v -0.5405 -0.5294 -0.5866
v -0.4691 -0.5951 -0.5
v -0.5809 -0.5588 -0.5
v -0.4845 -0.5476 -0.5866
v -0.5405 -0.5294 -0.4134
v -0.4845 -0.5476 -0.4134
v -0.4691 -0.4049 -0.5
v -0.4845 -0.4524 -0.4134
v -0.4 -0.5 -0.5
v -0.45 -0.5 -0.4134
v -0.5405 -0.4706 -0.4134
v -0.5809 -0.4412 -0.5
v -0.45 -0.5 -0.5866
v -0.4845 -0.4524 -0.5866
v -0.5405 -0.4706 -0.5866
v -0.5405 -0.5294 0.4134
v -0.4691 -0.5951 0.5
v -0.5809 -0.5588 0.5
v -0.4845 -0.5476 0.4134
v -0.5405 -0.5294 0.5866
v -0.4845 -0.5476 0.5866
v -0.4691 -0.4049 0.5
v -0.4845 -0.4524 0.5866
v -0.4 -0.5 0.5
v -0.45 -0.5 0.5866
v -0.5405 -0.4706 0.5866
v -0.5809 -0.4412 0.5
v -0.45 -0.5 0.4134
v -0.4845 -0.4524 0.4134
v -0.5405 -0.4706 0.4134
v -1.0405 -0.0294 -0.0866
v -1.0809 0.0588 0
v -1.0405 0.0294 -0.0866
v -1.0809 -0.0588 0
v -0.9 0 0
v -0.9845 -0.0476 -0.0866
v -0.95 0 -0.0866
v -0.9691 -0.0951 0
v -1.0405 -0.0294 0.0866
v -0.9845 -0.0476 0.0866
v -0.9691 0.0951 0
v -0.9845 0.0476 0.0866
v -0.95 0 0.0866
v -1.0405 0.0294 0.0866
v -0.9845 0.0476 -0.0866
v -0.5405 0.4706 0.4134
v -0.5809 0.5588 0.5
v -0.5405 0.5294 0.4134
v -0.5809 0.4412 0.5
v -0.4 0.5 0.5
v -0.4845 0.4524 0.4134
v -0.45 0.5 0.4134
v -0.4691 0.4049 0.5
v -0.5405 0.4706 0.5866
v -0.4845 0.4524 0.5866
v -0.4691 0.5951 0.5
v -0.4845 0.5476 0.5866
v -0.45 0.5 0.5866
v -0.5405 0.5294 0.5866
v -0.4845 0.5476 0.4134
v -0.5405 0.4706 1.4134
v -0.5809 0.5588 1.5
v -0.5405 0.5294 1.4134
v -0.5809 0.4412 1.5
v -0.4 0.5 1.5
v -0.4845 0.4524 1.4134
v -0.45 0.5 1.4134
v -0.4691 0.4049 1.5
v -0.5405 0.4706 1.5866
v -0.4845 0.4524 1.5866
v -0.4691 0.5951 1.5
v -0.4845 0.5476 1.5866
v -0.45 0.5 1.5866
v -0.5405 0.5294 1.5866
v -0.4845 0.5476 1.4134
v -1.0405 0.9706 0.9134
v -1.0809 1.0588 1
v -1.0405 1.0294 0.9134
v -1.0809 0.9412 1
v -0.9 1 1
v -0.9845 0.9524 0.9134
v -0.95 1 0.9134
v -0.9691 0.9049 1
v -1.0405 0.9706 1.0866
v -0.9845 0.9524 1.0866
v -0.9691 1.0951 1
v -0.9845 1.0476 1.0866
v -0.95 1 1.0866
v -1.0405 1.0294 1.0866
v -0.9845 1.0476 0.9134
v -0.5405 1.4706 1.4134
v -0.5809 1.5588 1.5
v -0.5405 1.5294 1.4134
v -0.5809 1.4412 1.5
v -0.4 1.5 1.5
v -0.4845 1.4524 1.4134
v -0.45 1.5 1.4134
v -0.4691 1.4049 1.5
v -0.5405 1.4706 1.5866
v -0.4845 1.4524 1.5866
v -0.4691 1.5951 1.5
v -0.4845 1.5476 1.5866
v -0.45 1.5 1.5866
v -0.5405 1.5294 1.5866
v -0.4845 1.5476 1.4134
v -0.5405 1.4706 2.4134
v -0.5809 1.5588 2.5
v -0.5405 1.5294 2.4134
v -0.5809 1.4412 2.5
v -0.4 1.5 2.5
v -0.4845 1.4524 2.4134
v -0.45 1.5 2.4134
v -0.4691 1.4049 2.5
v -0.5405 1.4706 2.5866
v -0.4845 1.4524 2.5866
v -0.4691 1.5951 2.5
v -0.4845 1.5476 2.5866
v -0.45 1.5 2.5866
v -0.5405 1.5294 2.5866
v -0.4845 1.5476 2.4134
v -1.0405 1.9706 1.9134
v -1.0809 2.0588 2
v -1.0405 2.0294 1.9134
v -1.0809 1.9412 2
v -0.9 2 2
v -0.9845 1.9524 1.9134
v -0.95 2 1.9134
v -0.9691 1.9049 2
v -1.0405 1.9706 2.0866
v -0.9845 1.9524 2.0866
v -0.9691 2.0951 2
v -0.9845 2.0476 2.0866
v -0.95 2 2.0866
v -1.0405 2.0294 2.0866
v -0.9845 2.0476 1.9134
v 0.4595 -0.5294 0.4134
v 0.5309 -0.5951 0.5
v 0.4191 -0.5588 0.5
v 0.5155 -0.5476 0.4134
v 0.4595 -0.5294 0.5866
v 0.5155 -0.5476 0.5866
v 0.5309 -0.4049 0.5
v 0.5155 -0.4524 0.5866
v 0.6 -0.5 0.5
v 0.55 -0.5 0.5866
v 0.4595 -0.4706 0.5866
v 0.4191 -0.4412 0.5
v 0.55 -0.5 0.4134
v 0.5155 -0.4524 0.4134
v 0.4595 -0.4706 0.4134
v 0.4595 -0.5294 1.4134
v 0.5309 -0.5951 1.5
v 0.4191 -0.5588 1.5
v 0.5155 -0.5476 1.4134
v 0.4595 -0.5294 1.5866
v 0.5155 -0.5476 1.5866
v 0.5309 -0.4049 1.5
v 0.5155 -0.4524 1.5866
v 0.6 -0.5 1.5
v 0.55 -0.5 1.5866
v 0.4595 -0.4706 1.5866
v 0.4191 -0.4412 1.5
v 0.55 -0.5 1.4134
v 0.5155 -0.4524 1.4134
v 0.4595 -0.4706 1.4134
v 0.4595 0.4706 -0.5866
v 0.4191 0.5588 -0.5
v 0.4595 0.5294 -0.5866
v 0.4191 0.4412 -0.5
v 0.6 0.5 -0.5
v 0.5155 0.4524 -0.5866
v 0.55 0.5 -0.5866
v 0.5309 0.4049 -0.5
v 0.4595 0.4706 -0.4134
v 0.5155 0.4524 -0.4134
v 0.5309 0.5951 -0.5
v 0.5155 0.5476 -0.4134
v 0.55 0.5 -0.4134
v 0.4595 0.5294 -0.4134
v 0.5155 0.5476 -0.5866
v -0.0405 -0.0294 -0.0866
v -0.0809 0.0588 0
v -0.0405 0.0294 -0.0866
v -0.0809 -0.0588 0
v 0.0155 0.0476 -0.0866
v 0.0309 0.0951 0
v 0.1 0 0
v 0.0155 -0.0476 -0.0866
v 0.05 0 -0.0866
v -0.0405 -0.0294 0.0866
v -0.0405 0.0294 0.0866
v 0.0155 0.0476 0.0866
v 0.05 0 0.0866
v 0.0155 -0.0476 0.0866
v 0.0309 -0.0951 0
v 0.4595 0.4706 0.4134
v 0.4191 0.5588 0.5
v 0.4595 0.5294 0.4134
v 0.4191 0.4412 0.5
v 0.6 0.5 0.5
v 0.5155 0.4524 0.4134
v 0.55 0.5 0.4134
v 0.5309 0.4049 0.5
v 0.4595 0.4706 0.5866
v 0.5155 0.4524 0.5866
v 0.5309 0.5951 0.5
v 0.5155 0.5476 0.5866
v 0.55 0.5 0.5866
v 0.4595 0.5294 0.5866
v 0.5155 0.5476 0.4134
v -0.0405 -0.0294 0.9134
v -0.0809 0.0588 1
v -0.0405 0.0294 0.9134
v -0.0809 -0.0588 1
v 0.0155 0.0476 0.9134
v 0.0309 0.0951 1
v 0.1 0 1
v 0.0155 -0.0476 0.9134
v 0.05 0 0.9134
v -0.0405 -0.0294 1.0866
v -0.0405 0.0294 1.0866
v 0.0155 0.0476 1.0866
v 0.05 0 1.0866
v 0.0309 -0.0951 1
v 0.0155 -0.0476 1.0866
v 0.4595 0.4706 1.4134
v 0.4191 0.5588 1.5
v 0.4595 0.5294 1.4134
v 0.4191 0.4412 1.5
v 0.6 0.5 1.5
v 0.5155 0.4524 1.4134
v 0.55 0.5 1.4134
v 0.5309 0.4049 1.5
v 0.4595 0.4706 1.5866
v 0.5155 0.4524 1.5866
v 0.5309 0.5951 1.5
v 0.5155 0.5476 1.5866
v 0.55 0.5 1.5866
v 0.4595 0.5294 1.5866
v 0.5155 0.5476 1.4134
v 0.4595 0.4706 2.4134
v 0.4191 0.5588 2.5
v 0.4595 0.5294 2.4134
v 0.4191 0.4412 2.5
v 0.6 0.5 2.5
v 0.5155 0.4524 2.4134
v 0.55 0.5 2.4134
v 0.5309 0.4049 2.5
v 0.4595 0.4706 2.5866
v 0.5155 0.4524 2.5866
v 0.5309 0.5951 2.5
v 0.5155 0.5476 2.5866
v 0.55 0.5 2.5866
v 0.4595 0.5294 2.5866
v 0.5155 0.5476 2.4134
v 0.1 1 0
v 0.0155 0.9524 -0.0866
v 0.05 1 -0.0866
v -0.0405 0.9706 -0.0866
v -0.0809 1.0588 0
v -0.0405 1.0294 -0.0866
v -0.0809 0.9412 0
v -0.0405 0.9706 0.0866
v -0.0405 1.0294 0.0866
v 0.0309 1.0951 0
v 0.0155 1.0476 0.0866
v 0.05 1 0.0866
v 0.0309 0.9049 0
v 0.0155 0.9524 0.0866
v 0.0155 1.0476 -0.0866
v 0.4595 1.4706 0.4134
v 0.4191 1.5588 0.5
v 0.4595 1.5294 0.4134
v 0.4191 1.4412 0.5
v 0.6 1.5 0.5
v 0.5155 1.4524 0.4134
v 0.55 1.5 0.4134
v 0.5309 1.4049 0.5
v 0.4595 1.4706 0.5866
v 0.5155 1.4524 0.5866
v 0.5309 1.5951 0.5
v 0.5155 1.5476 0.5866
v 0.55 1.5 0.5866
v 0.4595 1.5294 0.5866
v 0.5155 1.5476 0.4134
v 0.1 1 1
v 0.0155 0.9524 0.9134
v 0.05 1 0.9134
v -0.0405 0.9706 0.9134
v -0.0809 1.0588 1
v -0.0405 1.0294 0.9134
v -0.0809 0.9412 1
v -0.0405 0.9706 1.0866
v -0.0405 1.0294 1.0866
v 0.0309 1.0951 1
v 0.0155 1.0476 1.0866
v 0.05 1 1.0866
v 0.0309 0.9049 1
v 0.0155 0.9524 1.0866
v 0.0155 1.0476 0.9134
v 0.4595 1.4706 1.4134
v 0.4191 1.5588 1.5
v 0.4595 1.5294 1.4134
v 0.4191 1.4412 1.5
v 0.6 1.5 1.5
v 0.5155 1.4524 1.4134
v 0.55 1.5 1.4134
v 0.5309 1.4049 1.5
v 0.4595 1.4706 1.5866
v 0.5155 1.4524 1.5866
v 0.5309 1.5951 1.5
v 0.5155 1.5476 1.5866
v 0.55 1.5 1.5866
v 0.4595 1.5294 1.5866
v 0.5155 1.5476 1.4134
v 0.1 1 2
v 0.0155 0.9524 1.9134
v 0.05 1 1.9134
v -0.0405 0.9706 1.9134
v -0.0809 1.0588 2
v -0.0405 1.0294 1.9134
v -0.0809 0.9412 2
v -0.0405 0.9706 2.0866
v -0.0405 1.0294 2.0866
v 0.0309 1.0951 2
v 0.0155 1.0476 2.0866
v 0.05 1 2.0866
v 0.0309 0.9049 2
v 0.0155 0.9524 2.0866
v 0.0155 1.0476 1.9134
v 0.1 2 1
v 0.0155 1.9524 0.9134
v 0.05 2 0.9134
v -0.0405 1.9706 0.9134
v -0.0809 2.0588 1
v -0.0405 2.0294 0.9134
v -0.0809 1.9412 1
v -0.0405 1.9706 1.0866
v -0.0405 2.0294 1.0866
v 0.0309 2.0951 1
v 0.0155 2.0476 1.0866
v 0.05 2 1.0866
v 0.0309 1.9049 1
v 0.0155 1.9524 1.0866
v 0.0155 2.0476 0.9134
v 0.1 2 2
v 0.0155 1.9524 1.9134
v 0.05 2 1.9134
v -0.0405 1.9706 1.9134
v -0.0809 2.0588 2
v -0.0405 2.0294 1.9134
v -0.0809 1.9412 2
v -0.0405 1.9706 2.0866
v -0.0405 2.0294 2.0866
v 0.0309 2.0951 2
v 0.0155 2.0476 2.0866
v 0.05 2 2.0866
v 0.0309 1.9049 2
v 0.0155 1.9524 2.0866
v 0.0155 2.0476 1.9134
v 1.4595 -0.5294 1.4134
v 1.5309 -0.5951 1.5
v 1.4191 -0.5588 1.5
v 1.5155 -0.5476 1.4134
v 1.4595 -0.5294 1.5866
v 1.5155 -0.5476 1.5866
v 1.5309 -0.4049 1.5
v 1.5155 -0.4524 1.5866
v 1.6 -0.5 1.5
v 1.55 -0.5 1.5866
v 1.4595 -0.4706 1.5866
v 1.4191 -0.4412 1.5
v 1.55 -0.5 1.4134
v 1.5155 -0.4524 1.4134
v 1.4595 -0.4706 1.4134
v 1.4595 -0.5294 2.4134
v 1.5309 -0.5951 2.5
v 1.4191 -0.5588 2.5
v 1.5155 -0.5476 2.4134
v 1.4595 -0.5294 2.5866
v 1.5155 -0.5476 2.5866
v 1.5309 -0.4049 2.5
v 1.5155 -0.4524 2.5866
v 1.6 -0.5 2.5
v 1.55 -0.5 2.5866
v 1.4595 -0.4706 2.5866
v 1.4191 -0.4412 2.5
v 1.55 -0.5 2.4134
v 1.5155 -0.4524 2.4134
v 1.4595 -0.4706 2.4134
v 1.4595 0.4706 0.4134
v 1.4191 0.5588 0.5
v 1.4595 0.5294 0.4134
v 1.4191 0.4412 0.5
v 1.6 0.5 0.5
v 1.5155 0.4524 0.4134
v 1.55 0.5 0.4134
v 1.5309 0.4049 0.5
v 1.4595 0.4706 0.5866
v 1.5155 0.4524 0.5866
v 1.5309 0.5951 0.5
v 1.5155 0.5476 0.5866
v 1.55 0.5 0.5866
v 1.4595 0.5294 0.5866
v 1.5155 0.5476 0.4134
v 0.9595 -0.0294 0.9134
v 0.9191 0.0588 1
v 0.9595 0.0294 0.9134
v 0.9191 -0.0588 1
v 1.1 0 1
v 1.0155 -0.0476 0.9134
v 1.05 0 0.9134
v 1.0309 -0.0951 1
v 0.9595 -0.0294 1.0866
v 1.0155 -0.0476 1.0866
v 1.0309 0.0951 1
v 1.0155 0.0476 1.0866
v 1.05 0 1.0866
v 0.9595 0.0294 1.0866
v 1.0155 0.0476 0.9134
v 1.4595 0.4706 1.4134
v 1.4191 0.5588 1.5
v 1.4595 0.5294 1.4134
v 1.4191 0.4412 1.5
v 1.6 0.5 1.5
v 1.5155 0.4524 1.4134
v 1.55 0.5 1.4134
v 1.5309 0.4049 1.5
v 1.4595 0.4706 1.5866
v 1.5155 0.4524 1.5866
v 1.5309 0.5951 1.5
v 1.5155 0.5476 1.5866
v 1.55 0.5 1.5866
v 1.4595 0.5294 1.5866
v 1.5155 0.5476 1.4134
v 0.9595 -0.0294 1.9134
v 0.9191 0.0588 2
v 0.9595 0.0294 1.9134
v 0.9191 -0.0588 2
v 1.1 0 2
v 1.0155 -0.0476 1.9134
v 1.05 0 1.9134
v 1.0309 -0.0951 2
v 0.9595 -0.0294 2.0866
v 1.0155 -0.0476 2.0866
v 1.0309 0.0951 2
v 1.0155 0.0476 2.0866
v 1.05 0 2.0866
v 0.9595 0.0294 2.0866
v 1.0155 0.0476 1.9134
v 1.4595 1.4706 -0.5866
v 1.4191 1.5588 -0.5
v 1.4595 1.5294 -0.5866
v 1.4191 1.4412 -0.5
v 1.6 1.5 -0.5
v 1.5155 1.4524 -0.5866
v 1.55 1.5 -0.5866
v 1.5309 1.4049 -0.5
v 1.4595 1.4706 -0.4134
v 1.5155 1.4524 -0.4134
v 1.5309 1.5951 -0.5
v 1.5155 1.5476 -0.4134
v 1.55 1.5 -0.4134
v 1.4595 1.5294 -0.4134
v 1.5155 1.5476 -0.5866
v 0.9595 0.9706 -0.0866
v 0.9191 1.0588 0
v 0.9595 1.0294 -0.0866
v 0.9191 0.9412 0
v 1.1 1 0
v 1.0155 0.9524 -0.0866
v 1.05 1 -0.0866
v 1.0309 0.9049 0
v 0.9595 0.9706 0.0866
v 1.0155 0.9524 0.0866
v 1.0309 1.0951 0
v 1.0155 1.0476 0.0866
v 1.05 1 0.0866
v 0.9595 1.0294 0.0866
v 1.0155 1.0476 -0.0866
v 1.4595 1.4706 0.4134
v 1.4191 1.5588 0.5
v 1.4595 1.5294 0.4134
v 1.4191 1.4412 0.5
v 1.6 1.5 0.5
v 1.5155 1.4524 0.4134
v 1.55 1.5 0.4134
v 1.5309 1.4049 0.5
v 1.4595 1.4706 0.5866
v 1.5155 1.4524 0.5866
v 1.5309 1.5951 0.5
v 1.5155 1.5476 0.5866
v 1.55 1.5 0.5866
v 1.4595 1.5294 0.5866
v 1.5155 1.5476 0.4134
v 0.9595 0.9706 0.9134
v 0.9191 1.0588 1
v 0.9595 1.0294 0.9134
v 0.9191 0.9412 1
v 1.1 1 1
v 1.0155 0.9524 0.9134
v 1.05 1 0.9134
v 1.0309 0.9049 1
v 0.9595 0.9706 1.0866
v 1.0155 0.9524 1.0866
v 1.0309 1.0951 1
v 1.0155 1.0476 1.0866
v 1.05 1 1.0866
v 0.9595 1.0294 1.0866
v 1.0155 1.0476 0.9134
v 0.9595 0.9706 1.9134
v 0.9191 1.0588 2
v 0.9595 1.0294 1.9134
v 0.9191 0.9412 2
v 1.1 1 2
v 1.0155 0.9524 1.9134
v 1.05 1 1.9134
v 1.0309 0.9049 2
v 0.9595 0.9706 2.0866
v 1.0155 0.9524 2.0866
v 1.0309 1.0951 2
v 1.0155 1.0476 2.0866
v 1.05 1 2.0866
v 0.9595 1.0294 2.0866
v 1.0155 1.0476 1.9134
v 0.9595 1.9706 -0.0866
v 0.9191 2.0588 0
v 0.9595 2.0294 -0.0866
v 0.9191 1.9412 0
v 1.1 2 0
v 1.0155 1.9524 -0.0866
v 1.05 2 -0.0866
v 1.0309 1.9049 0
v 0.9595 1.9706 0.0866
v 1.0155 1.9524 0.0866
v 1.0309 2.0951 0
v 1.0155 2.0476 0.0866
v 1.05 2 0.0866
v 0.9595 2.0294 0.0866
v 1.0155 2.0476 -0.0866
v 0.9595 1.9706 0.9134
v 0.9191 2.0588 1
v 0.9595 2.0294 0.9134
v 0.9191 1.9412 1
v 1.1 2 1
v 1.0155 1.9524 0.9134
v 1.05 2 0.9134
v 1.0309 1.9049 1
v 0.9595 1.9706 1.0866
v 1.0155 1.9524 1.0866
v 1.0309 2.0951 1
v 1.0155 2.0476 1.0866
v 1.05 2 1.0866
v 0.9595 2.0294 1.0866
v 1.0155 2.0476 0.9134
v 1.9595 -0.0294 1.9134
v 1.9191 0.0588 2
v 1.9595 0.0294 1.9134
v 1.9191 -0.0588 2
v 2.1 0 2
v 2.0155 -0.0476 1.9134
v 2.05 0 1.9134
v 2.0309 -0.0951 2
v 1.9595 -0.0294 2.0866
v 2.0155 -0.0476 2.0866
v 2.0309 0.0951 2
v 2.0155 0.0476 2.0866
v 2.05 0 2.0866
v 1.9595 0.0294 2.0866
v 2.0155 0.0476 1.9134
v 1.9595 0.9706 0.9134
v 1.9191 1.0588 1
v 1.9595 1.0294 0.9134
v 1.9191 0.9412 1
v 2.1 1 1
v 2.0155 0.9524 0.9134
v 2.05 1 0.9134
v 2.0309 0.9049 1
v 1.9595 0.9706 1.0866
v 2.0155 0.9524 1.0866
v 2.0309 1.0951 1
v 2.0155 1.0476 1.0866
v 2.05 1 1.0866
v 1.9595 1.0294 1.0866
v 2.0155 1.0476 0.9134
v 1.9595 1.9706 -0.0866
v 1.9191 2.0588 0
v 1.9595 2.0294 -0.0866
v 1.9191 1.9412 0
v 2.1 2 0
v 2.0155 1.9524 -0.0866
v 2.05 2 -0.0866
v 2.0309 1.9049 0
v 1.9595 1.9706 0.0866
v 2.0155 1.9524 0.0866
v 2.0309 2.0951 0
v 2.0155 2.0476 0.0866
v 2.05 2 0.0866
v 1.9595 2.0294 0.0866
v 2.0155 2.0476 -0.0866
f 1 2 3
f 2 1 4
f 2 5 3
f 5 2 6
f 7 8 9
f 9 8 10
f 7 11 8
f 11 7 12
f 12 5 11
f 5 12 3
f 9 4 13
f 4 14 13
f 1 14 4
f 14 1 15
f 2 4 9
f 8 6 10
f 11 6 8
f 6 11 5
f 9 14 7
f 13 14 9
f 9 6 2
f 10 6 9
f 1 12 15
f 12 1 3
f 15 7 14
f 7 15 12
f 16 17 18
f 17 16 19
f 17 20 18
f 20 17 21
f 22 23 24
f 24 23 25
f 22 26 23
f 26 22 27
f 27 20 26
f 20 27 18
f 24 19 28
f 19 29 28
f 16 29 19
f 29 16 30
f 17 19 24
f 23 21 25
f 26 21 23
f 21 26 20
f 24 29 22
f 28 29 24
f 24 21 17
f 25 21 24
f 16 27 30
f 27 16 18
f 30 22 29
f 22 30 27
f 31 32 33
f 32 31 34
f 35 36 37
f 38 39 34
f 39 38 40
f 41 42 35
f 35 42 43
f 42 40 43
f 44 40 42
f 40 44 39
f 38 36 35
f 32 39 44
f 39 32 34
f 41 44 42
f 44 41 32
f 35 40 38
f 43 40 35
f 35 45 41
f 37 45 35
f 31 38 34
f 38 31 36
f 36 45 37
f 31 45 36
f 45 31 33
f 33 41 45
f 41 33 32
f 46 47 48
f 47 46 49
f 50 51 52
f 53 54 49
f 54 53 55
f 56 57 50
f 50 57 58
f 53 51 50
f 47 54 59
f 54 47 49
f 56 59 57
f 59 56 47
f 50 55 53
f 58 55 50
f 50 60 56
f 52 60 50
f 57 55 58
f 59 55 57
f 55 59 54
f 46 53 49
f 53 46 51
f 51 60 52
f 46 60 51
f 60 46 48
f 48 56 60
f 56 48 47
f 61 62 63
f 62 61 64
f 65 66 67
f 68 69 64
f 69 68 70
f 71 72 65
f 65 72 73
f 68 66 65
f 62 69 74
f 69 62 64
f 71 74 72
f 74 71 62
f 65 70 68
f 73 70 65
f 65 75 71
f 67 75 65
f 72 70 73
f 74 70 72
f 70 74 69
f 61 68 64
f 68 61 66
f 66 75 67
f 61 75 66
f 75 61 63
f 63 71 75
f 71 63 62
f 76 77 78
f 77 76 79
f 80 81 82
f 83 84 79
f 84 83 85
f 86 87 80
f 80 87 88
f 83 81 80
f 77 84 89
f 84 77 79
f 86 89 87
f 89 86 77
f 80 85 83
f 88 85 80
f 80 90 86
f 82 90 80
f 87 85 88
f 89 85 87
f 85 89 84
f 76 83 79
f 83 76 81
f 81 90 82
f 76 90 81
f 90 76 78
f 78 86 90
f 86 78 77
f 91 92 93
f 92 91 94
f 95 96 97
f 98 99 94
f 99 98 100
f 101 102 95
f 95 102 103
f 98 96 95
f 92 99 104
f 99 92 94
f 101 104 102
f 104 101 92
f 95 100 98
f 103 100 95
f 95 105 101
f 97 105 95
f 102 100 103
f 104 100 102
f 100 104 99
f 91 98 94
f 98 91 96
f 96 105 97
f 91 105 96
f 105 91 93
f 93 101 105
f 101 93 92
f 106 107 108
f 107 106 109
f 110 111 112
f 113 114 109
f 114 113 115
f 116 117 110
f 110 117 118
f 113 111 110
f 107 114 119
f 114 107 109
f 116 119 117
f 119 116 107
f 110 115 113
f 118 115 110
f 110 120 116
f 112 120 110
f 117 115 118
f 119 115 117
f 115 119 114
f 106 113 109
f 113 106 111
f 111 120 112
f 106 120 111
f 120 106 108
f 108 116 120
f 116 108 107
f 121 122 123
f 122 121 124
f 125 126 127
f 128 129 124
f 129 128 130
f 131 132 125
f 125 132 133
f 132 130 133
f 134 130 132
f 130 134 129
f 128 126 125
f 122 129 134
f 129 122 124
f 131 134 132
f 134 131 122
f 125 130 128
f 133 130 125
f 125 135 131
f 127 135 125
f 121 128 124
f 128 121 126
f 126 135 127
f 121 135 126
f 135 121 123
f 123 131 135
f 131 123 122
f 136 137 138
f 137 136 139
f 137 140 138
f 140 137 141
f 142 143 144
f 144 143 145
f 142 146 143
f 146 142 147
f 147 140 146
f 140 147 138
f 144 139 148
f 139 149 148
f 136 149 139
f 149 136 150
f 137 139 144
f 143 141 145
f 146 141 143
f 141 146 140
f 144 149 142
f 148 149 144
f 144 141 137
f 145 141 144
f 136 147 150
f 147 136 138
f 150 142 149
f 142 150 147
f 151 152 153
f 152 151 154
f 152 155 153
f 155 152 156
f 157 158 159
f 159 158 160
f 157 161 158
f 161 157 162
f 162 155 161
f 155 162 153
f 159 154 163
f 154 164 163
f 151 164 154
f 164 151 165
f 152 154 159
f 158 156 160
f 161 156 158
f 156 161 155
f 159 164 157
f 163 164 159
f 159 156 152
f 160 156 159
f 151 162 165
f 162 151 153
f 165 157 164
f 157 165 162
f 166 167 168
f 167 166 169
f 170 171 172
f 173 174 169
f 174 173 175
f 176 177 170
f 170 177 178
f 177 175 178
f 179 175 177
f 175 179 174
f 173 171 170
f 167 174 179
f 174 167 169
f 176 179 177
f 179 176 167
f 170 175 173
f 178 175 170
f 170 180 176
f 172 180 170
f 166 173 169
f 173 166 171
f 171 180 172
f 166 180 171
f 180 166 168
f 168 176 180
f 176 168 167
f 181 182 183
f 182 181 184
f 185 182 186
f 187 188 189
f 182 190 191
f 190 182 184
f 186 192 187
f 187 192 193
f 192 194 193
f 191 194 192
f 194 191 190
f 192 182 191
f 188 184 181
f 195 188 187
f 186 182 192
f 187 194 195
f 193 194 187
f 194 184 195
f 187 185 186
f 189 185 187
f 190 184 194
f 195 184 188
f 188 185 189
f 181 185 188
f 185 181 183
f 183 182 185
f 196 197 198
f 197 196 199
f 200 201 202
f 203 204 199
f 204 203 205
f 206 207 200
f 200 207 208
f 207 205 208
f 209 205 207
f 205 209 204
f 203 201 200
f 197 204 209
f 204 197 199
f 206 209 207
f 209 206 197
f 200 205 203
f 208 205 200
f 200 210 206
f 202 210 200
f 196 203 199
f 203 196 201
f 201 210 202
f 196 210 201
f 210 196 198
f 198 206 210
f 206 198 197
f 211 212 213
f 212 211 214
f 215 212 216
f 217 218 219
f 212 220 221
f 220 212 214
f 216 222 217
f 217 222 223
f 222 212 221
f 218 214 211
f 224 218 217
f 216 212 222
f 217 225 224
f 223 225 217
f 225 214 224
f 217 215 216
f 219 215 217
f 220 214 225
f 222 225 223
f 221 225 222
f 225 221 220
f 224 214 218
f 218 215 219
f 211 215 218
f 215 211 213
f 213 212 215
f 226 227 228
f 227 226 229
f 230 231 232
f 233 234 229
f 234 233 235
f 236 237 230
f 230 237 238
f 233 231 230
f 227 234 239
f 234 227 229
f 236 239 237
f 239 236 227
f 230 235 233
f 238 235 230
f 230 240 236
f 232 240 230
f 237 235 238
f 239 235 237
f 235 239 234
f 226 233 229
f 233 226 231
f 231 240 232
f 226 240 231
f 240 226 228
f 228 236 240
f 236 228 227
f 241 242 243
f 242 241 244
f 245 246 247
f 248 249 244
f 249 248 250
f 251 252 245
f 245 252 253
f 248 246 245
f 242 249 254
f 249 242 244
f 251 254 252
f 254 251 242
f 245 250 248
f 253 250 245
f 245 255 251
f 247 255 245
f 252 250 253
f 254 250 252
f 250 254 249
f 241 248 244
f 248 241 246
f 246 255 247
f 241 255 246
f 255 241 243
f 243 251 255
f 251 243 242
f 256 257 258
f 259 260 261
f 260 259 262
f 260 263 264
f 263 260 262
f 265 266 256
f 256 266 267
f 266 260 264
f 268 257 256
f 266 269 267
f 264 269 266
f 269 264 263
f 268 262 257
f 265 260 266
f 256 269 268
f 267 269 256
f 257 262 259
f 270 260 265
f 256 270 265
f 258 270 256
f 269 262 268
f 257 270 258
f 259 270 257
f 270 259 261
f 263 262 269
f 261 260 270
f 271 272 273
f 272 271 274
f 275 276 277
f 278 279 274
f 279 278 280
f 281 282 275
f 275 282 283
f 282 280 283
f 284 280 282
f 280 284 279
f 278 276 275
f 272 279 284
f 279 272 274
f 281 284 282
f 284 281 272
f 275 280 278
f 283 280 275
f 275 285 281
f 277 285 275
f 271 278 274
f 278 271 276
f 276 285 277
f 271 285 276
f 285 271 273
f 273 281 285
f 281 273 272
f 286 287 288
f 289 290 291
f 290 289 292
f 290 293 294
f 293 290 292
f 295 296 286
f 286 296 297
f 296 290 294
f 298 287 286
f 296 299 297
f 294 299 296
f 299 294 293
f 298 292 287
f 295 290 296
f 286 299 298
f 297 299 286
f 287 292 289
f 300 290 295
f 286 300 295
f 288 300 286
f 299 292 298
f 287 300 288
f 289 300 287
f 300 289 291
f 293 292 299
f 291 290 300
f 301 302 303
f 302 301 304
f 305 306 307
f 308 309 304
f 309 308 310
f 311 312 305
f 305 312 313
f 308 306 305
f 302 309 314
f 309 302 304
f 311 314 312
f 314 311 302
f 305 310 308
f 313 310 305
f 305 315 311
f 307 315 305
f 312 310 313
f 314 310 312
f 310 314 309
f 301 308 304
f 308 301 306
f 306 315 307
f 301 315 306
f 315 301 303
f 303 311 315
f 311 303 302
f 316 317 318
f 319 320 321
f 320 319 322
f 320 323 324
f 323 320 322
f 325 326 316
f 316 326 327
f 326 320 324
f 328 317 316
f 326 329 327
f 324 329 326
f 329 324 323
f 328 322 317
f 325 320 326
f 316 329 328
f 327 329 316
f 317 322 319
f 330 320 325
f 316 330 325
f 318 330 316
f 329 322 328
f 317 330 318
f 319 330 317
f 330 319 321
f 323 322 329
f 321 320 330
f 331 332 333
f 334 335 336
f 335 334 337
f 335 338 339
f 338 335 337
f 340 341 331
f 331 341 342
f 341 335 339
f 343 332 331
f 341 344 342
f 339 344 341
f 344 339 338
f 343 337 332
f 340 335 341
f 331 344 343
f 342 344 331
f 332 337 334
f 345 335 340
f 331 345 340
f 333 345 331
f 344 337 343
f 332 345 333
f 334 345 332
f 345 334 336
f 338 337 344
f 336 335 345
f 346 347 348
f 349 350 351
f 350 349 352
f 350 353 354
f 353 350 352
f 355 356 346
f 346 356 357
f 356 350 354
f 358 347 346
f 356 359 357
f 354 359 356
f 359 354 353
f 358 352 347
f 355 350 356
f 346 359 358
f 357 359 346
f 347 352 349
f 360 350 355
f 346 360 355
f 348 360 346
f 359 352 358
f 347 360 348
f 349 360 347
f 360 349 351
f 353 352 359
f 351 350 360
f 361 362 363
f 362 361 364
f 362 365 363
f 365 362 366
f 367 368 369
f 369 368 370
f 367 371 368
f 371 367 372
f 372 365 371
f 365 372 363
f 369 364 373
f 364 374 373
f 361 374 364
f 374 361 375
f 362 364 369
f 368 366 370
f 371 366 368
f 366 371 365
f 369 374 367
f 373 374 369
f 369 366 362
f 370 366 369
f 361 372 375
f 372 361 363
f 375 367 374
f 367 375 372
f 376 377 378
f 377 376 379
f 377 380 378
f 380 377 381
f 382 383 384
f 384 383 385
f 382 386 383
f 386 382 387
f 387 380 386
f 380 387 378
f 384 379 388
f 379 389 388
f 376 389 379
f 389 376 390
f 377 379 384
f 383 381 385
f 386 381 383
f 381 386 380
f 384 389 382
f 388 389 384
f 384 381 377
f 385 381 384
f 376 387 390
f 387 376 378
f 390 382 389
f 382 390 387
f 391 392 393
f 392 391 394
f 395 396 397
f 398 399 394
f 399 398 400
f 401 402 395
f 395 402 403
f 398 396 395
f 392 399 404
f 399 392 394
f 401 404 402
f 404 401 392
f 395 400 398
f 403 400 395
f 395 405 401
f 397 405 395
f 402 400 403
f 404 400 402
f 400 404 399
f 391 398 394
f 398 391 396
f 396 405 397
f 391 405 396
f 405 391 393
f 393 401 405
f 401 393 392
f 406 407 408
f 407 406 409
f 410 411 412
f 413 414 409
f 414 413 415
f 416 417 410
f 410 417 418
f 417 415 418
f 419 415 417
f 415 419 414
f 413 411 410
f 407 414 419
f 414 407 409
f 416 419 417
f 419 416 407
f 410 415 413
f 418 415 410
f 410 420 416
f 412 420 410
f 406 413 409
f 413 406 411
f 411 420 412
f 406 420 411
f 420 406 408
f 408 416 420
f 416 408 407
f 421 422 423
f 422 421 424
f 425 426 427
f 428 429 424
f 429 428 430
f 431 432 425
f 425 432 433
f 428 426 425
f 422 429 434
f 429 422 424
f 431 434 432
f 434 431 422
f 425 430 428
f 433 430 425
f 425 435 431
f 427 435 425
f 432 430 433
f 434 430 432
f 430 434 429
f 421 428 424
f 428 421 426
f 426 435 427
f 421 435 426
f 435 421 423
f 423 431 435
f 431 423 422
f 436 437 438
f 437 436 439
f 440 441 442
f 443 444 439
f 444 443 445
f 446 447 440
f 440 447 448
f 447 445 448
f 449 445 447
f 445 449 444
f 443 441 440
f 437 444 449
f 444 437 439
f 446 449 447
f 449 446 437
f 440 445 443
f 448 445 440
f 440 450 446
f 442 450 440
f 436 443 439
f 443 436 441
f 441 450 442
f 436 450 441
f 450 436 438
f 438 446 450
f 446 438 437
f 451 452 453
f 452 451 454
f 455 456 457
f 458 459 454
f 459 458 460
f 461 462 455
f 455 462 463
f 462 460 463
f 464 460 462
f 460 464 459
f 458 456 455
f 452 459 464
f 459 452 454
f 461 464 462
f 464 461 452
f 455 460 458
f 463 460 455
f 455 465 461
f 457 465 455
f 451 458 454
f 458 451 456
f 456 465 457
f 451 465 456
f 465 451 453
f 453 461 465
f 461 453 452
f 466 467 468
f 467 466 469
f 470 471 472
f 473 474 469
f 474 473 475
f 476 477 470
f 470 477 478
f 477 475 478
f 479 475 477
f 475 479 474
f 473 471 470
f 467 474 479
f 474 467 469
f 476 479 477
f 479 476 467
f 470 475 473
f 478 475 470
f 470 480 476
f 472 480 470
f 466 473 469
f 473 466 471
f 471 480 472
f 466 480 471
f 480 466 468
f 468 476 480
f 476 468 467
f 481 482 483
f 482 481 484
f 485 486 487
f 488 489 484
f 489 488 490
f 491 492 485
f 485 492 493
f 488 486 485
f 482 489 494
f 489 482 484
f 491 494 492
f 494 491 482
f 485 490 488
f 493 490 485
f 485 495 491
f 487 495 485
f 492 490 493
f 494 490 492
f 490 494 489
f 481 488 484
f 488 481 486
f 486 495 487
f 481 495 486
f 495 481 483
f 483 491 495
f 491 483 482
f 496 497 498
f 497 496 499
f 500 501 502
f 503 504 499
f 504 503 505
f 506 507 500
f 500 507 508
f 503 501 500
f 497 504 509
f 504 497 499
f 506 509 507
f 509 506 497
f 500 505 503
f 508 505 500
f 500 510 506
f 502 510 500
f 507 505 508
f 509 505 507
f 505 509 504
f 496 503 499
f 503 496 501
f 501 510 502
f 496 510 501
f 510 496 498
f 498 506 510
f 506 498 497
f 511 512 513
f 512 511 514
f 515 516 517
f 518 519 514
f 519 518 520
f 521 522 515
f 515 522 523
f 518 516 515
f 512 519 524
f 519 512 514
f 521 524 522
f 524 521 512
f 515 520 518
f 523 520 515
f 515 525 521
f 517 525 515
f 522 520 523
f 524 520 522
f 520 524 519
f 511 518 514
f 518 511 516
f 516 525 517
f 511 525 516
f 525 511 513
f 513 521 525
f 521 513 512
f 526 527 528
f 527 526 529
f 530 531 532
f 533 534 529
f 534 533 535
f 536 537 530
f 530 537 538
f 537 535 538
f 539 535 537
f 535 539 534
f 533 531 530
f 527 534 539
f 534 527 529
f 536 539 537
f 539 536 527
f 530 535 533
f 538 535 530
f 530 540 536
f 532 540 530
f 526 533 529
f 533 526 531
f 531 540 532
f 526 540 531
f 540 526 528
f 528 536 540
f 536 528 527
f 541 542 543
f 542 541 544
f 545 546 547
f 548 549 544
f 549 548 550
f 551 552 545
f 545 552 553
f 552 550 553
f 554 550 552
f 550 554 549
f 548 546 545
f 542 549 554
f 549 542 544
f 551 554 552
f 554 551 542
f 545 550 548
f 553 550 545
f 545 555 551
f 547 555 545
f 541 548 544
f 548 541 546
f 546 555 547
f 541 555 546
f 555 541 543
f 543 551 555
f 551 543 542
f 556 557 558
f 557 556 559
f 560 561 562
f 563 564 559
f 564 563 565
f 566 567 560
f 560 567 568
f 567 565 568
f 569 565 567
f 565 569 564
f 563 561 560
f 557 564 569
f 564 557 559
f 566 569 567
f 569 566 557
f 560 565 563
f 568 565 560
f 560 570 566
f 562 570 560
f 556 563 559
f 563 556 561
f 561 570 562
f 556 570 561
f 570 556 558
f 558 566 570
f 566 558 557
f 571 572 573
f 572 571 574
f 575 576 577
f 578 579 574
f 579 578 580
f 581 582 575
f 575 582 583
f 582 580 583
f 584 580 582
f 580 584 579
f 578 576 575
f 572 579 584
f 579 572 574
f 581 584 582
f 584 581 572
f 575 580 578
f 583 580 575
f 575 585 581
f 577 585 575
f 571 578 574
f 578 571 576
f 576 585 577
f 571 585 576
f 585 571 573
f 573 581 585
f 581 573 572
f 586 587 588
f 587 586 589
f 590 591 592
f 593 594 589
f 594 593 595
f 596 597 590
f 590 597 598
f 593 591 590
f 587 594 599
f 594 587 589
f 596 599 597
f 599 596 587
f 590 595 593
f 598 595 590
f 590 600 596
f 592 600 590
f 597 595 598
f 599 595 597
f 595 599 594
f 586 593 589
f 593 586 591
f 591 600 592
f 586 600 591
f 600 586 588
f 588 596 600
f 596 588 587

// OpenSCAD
// file: 3d_tetrahedres.scad
use <lattice.scad>;

// Check if a vertex is adjacent to the central layer (that sets the size of processor).
// n as n_code in article (starts at 1).
function central_layer(x, z, n) = ((x+z == n-2) || (x+z == n-1)) ? true : false;

// Elementary tetrahedron as described in Equation (18) of arXiv:1311.0879.
// x, y, z : coordinates of vector x in arXiv:1311.0879
// s : +- 1
// permut : integer between 0 and 5 (included) that describe the permutation (a, b, c) :
//          0 : (a, b, c) = (i, j, k)
//          1 : (a, b, c) = (i, k, j)
//          2 : (a, b, c) = (j, i, k)
//          3 : (a, b, c) = (j, k, i)
//          4 : (a, b, c) = (k, i, j)
//          5 : (a, b, c) = (j, j, i)
// n : we keep only tetrahedron included in the code structure indexed by n.
//     n is as in Equation (19) of arXiv:1311.0879 (starts at 1).
//     use -1 for no filter
 module tetraedre (x, y, z, s, permut, n) {
     // if (permut==0) {xa=1; ya=0; za=0; xb=0; yb=1; zb=0; xc=0; yc=0; zc=1;}
     // if (permut==1) {xa=1; ya=0; za=0; xb=0; yb=0; zb=1; xc=0; yc=1; zc=0;}
     // if (permut==2) {xa=0; ya=1; za=0; xb=1; yb=0; zb=0; xc=0; yc=0; zc=1;}
     // if (permut==3) {xa=0; ya=1; za=0; xb=0; yb=0; zb=1; xc=1; yc=0; zc=0;}
     // if (permut==4) {xa=0; ya=0; za=1; xb=1; yb=0; zb=0; xc=0; yc=1; zc=0;}
     // if (permut==5) {xa=0; ya=0; za=1; xb=0; yb=1; zb=0; xc=1; yc=0; zc=0;}
     xa = permut==0 || permut==1 ? 1 : 0;
     ya = permut==2 || permut==3 ? 1 : 0;
     za = permut==4 || permut==5 ? 1 : 0;
     xb = permut==2 || permut==4 ? 1 : 0;
     yb = permut==0 || permut==5 ? 1 : 0;
     zb = permut==1 || permut==3 ? 1 : 0;
     xc = permut==3 || permut==5 ? 1 : 0;
     yc = permut==1 || permut==4 ? 1 : 0;
     zc = permut==0 || permut==2 ? 1 : 0;

     // Coordinates of vertices of the tetrahedron.
     x1=x; y1=y; z1=z;                                               // x
     x2=x+xa; y2=y+ya; z2=z+za;                                      // x + a
     x3=x+(xa+s*xb+xc)/2; y3=y+(ya+s*yb+yc)/2; z3=z+(za+s*zb+zc)/2;  // x + (a+sb+c)/2
     x4=x+(xa+s*xb-xc)/2; y4=y+(ya+s*yb-yc)/2; z4=z+(za+s*zb-zc)/2;  // x + (a+sb-c)/2

     if (n == -1 || (
         filtre(x1, y1, z1, n)
         && filtre(x2, y2, z2, n)
         && filtre(x3, y3, z3, n)
         && filtre(x4, y4, z4, n)
     )) {
         // echo(x, y, z, s, permut, n);
         if (central_layer(x1, z1, n)
             && central_layer(x2, z2, n)
             && central_layer(x3, z3, n)
             && central_layer(x4, z4, n))
            {
             echo("One central tetraedron");
             color("red")
             polyhedron(
                 points=[[x1,y1,z1], [x2,y2,z2], [x3,y3,z3], [x4,y4,z4]],
                 faces=[[0,1,2], [0,1,3], [0,2,3], [1,3,2]]
                );
            }
         else {
             polyhedron(
                 points=[[x1,y1,z1], [x2,y2,z2], [x3,y3,z3], [x4,y4,z4]],
                 faces=[[0,1,2], [0,1,3], [0,2,3], [1,3,2]]
                );
            }
        }
    }


n = 3;
grille(n);

for (x = [-1:n-1]) {
        for (y = [-1:n-1]) {
            for (z = [-1:n-1]) {
                for (s=[-1:2:1]) {
                    for (permut = [0:5]) {
                        tetraedre(x, y, z, s, permut, n);
                    }
                }
            }
        }
    }
// file: lattice.scad
// Centered cubic grid, as presented in Equation (18) from arXiv:1311.0879


//  Uncut centered cubic grid.
module maille(nb) {
    // Diameter of small balls
    rad = 0.1;
    for (x = [0:nb]) {
        for (y = [0:nb]) {
            for (z = [0:nb]) {
                type = abs((x + y + z) % 2);  // Correspond to color
                x2 = x+0.5; y2 = y+0.5; z2 = z+0.5;
                if (type == 0) {
                        color("red") translate([x, y, z]) sphere(rad);
                        color("blue") translate([x2, y2, z2]) sphere(rad);
                        }
                if (type == 1) {
                    color("green") translate([x, y, z]) sphere(rad);
                    color("yellow") translate([x2, y2, z2]) sphere(rad);
                    }
                }
            }
        }
    }



// Check Equation (19) of arXiv:1311.0879 (n stars at 1).
function filtre(x, y, z, n) = ((x+y+z <= 0 + 2*(n-1))
                               && (x-y-z <= 1/2)
                               && (-x+y-z <= 1)
                               && (-x-y+z <= 3/2)) ? true : false;


// Grid as presented in Equations (18) and (19) of arXiv:1311.0879.
// n : number n in Equation (19): index in the code family, starts at 1.
module grille(n) {
    // Diameter of small balls
    rad = 0.1;
    for (x = [-1:n-1]) {
        for (y = [-1:n-1]) {
            for (z = [-1:n-1]) {
                type = abs((x + y + z) % 2);  // Correspond to color
                if (filtre(x, y, z, n)) {
                    if (type == 0) {
                        color("red") translate([x, y, z]) sphere(rad);
                        }
                    if (type == 1) {
                        color("green") translate([x, y, z]) sphere(rad);
                        }
                    }
                x2 = x+0.5; y2 = y+0.5; z2 = z+0.5;
                if (filtre(x2, y2, z2, n)) {
                    if (type == 0) {
                        color("blue") translate([x2, y2, z2]) sphere(rad);
                        }
                    if (type == 1) {
                        color("yellow") translate([x2, y2, z2]) sphere(rad);
                        }
                    }
                }
            }
        }
    }

//maille(2);
grille(2);
// main file
use <lattice.scad>;
use <3d_tetrahedres.scad>;

// layer 1 : 2 qubit
color("black") tetraedre(-1, 0, 0, -1, 0, 3);
color("black") tetraedre(-1, 0, 0, 1, 1, 3);

// layer 2 : 14 qubit
color("Chartreuse") tetraedre(0, 1, 0, -1, 0, 3);
color("Chartreuse") tetraedre(0, 0, 0, 1, 2, 3);
color("Chartreuse") tetraedre(0, 0, 0, 1, 4, 3);
color("Chartreuse") tetraedre(0, 0, 0, 1, 3, 3);
color("Chartreuse") tetraedre(0, 0, 0, 1, 5, 3);
color("Chartreuse") tetraedre(0, 0, 0, -1, 5, 3);
color("Chartreuse") tetraedre(0, 0, 0, -1, 4, 3);
color("Chartreuse") tetraedre(-1, 1, 1, -1, 0, 3);
color("Chartreuse") tetraedre(0, 0, 1, -1, 3, 3);
color("Chartreuse") tetraedre(0, 1, 0, -1, 5, 3);
color("Chartreuse") tetraedre(0, 0, 1, -1, 2, 3);
color("Chartreuse") tetraedre(0, 1, 0, 1, 1, 3);
color("Chartreuse") tetraedre(0, 1, 0, 1, 4, 3);
color("Chartreuse") tetraedre(-1, 1, 1, 1, 1, 3);

// layer 3 : 33 qubits
    // first set : 10 qubits
    color("Magenta") tetraedre(0, 0, 1, -1, 1, 3);
    color("Magenta") tetraedre(1, 1, 0, 1, 2, 3);
    color("Magenta") tetraedre(1, 1, 0, 1, 3, 3);
    color("Magenta") tetraedre(0, 1, 1, -1, 1, 3);
    color("Magenta") tetraedre(1, 1, 0, -1, 4, 3);
    color("Magenta") tetraedre(0, 0, 1, 1, 3, 3);
    color("Magenta") tetraedre(0, 0, 1, 1, 2, 3);
    color("Magenta") tetraedre(0, 1, 1, 1, 2, 3);
    color("Magenta") tetraedre(0, 1, 1, 1, 3, 3);
    color("Magenta") tetraedre(0, 1, 1, -1, 4, 3);

    // second set : 10 qubits
    color("Magenta") tetraedre(1, 1, 0, 1, 4, 3);
    color("Magenta") tetraedre(1, 0, 1, -1, 3, 3);
    color("Magenta") tetraedre(1, 0, 1, -1, 2, 3);
    color("Magenta") tetraedre(0, 0, 1, 1, 1, 3);
    color("Magenta") tetraedre(0, 1, 1, 1, 1, 3);
    color("Magenta") tetraedre(0, 1, 1, 1, 4, 3);
    color("Magenta") tetraedre(1, 1, 1, -1, 3, 3);
    color("Magenta") tetraedre(1, 1, 1, -1, 2, 3);
    color("Magenta") tetraedre(0, 1, 2, -1, 3, 3);
    color("Magenta") tetraedre(0, 1, 2, -1, 2, 3);

    // third set : 13 qubits
    color("Magenta") tetraedre(0, 0, 1, -1, 0, 3);
    color("Magenta") tetraedre(1, 1, 0, 1, 5, 3);
    color("Magenta") tetraedre(0, 1, 1, -1, 0, 3);
    color("Magenta") tetraedre(1, 1, 0, -1, 5, 3);
    color("Magenta") tetraedre(0, 0, 1, 1, 0, 3);
    color("Magenta") tetraedre(1, 2, 0, -1, 0, 3);
    color("Magenta") tetraedre(0, 1, 1, 1, 0, 3);
    color("Magenta") tetraedre(0, 1, 1, 1, 5, 3);
    color("Magenta") tetraedre(1, 2, 0, -1, 5, 3);
    color("Magenta") tetraedre(0, 2, 1, -1, 0, 3);
    color("Magenta") tetraedre(0, 1, 1, -1, 5, 3);
    color("Magenta") tetraedre(-1, 2, 2, -1, 0, 3);
    color("Magenta") tetraedre(0, 2, 1, -1, 5, 3);


// layer 4 : 14 qubits
color("Cyan") tetraedre(1, 0, 1, 1, 2, 3);
color("Cyan") tetraedre(1, 0, 1, 1, 4, 3);
color("Cyan") tetraedre(1, 0, 1, 1, 3, 3);
color("Cyan") tetraedre(1, 0, 1, 1, 5, 3);
color("Cyan") tetraedre(1, 0, 1, -1, 5, 3);
color("Cyan") tetraedre(1, 0, 1, -1, 4, 3);
color("Cyan") tetraedre(1, 1, 1, -1, 0, 3);
color("Cyan") tetraedre(1, 1, 1, -1, 1, 3);
color("Cyan") tetraedre(1, 0, 2, -1, 3, 3);
color("Cyan") tetraedre(1, 1, 1, -1, 5, 3);
color("Cyan") tetraedre(1, 0, 2, -1, 2, 3);
color("Cyan") tetraedre(1, 1, 1, -1, 4, 3);
color("Cyan") tetraedre(0, 1, 2, -1, 0, 3);
color("Cyan") tetraedre(0, 1, 2, -1, 1, 3);

//// layer 5 : 2 qubits
color("Orange") tetraedre(1, 0, 2, -1, 0, 3);
color("Orange") tetraedre(1, 0, 2, -1, 1, 3);

grille(3);
